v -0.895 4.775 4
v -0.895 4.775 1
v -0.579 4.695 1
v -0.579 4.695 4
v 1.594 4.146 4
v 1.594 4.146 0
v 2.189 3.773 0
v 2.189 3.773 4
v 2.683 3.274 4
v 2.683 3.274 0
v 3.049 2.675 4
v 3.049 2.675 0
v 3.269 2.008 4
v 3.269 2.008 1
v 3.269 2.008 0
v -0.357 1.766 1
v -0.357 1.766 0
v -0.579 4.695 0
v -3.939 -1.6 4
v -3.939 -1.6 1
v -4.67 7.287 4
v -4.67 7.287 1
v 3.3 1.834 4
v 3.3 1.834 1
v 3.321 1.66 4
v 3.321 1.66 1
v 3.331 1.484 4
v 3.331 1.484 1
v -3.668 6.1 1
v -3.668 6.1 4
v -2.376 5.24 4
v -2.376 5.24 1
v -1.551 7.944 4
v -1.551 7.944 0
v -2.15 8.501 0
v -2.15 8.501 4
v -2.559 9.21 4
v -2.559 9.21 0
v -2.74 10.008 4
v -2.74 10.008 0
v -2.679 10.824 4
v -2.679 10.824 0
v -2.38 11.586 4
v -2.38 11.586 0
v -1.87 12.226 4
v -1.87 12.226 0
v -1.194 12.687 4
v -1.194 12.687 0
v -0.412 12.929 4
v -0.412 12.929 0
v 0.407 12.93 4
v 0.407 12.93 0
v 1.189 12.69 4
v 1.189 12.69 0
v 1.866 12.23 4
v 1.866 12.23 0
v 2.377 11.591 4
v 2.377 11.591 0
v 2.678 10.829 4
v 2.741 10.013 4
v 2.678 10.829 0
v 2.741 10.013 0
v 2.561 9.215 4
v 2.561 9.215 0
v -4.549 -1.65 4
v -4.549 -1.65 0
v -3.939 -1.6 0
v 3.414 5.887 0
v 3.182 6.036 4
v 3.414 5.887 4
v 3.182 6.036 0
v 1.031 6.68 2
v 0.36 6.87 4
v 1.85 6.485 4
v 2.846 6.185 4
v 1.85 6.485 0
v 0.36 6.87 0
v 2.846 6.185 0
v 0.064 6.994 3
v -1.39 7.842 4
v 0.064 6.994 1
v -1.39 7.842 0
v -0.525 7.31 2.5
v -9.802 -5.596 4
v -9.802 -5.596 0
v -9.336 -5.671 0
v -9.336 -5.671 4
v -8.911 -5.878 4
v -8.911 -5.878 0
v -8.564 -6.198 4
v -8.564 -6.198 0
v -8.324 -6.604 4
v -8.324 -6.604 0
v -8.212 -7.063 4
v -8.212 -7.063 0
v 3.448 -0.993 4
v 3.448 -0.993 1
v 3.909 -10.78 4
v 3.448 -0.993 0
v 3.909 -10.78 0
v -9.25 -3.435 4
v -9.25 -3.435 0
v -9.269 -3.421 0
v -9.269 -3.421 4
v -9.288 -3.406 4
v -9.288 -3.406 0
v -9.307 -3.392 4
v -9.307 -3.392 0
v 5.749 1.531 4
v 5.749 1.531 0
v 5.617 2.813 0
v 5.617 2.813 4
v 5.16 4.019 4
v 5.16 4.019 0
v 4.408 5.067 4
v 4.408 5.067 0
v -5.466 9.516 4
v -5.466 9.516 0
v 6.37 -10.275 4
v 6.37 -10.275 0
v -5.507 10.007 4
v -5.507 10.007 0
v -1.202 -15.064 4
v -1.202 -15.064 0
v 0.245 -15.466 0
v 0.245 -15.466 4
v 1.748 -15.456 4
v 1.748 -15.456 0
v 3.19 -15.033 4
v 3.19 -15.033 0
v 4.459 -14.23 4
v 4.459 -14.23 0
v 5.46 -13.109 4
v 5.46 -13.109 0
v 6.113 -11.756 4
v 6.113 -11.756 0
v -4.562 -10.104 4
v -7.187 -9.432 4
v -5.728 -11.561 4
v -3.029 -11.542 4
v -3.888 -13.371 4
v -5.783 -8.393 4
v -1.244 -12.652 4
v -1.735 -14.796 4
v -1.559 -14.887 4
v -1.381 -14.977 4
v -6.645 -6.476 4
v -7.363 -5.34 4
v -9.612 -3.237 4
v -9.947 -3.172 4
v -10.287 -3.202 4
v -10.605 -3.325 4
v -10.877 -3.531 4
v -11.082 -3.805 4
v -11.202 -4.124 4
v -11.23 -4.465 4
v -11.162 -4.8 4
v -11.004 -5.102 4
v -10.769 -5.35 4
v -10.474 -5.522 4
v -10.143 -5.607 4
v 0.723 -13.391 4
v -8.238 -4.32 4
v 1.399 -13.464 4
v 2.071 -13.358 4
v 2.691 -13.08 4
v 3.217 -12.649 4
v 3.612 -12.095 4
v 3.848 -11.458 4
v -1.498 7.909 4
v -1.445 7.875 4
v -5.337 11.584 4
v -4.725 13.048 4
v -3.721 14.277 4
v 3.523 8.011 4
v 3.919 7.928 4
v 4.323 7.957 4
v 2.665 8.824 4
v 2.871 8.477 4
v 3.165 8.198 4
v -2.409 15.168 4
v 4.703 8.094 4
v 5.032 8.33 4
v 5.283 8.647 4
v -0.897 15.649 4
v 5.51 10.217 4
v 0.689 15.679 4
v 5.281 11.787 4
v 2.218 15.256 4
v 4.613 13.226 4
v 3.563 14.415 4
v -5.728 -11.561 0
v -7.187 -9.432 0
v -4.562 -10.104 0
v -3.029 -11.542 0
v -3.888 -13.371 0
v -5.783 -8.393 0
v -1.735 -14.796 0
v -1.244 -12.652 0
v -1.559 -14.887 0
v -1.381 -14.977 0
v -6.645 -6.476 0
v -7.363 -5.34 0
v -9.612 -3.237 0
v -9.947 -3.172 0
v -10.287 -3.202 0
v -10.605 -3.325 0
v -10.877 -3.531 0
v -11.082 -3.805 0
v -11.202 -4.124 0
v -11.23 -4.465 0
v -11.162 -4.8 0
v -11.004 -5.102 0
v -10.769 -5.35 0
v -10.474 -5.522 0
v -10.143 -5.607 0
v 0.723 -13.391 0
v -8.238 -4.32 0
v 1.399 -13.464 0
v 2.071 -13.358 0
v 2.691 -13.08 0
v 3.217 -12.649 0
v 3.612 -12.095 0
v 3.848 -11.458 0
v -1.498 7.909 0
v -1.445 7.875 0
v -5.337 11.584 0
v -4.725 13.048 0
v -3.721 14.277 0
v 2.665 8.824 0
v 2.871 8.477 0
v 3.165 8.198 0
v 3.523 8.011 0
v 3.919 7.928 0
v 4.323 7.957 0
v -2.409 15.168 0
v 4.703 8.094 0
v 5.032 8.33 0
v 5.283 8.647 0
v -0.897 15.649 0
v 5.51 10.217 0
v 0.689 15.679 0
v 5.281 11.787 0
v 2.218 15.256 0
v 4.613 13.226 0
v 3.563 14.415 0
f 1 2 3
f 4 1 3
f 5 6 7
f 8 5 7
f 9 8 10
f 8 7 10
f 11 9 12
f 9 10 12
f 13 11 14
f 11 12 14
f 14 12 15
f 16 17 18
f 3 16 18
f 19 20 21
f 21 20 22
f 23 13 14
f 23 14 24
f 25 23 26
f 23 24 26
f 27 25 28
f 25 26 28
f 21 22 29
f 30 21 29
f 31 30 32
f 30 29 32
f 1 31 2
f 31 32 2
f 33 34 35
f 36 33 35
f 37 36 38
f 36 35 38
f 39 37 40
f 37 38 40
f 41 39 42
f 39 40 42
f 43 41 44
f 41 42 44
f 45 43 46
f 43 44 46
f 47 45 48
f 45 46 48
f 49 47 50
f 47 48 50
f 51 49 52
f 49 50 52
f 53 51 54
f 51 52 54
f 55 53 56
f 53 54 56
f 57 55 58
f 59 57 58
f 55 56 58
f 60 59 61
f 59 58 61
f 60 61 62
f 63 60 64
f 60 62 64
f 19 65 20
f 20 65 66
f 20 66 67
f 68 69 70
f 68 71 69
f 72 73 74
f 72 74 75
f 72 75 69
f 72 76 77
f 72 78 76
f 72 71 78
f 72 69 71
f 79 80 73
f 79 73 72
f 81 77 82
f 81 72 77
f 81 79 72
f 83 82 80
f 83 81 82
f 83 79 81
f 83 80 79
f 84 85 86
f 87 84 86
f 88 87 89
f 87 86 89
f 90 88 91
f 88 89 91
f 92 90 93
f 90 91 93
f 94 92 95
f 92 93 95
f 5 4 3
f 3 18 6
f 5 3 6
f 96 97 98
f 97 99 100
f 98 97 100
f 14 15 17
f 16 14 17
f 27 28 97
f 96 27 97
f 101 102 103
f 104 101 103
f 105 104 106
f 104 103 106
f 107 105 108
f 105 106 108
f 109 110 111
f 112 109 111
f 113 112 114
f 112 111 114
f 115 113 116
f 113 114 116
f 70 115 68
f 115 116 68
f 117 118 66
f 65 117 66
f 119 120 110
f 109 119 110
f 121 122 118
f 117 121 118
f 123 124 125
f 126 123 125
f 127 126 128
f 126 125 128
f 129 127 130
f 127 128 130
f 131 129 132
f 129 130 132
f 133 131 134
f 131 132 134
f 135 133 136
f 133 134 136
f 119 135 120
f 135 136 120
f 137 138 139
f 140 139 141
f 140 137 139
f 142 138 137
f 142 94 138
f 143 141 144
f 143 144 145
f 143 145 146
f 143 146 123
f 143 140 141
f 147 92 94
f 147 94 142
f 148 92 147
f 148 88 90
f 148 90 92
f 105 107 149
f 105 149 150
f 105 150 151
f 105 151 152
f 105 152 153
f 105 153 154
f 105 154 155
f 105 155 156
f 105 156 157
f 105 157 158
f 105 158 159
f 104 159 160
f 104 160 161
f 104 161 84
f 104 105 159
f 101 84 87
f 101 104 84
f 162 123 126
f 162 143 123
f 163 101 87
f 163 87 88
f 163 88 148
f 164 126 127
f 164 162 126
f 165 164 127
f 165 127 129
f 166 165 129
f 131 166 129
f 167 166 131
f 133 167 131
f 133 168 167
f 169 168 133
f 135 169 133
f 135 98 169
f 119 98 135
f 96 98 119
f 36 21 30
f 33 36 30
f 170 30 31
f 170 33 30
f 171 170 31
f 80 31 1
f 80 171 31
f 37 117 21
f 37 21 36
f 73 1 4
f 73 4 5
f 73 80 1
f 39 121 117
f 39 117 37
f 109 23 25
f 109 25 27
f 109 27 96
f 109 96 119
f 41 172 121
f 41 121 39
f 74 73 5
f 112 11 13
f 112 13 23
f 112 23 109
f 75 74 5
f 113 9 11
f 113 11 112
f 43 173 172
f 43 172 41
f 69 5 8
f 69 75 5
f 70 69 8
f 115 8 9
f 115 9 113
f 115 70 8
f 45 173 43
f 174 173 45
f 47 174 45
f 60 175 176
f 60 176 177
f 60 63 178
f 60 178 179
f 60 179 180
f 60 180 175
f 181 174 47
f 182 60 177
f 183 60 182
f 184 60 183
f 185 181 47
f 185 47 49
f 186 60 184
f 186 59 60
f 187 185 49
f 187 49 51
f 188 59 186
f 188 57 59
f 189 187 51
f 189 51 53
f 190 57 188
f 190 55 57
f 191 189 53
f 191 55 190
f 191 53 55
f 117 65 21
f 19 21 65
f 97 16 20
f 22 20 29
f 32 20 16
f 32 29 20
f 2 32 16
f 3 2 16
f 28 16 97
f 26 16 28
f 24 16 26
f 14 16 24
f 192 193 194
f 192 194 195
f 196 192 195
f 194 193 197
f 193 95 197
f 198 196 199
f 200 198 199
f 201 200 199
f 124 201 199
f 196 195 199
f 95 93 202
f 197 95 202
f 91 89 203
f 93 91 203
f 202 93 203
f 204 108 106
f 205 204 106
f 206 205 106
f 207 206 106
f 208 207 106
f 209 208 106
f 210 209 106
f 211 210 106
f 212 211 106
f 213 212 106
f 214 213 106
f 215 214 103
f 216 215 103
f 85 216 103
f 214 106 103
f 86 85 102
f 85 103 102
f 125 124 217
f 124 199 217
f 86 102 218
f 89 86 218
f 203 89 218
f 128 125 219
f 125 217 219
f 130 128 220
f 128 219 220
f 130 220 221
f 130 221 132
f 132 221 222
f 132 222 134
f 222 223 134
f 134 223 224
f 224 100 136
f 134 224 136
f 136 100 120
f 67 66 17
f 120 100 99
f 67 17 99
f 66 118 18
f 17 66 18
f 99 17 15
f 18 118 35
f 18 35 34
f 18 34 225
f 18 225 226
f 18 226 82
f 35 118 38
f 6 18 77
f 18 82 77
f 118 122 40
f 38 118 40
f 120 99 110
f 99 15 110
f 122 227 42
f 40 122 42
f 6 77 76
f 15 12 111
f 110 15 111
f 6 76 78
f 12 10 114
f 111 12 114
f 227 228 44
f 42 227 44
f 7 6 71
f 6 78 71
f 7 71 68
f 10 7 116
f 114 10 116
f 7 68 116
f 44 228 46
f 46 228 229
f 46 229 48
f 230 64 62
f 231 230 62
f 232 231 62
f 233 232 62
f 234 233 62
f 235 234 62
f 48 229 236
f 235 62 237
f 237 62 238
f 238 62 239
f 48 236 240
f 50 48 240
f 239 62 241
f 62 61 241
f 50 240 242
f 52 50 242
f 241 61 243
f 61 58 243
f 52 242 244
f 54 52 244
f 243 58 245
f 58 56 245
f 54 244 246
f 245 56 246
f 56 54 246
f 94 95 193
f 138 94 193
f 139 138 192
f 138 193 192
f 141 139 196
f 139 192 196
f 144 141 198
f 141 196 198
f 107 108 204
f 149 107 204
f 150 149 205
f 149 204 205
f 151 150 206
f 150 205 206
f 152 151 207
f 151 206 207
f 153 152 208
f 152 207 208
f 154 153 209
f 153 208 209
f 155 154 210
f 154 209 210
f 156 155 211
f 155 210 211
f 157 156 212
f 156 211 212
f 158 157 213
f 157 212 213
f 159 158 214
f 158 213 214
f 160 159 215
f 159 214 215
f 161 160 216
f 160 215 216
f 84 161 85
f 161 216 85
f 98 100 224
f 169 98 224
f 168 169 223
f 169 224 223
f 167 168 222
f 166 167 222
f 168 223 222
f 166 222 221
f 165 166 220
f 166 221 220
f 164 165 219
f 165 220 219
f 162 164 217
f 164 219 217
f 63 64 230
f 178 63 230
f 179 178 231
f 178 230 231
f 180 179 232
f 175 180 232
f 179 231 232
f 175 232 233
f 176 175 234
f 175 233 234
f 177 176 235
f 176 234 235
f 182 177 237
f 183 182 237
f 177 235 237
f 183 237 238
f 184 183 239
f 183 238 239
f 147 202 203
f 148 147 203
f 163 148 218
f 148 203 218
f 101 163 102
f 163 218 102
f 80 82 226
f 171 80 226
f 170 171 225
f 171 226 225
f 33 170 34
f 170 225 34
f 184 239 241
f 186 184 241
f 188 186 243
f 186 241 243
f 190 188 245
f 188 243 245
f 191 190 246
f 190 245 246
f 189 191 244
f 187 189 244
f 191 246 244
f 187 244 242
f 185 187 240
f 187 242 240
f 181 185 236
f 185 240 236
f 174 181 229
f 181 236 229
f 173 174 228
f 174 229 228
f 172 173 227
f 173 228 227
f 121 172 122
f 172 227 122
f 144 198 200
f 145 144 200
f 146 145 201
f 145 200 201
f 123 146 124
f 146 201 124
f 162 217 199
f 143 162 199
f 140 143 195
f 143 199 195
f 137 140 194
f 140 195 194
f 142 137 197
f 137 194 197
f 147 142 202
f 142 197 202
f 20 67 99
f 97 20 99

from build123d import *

# Parameters (mm, degrees)
F1_DEPTH = 4
F2_DEPTH = 1
F3_DEPTH = 4


with BuildPart() as f1:
    # F0 (on Top) → F1 (new body)
    with BuildSketch(Plane.XY):
        with BuildLine():
            ThreePointArc((-1.5508525785, 7.9438418354), (-0.8117387783, 12.8375466645), (2.5605860204, 9.2151080362))
            ThreePointArc((2.5605860204, 9.2151080362), (3.7184283285, 7.9559790876), (5.2833155314, 8.6467269154))
            ThreePointArc((5.2833155314, 8.6467269154), (0.6891933533, 15.6793977841), (-5.5065598875, 10.00691509))
            Line((-5.5065598875, 10.00691509), (-5.4662271831, 9.5160487318))
            ThreePointArc((-5.4662271831, 9.5160487318), (-5.1890353006, 8.3580166056), (-4.6695398419, 7.2865698204))
            ThreePointArc((-4.6695398419, 7.2865698204), (-3.0526487171, 5.624718363), (-0.8952786583, 4.7751057418))
            Line((-0.8952786583, 4.7751057418), (-0.5786401844, 4.6951146522))
            Line((-0.5786401844, 4.6951146522), (1.5938929177, 4.1462764523))
            ThreePointArc((1.5938929177, 4.1462764523), (2.6825813347, 3.2735631577), (3.2693851036, 2.0076515096))
            ThreePointArc((3.2693851036, 2.0076515096), (3.3114958995, 1.7472962445), (3.3309836872, 1.4842783567))
            Line((3.3309836872, 1.4842783567), (3.4477516729, -0.9928926231))
            Line((3.4477516729, -0.9928926231), (3.9091161415, -10.7804954964))
            ThreePointArc((3.9091161415, -10.7804954964), (2.9687698725, -12.8820847985), (0.7233424694, -13.3909899741))
            ThreePointArc((0.7233424694, -13.3909899741), (-3.8310752971, -10.860666841), (-6.6450210288, -6.4758104272))
            ThreePointArc((-6.6450210288, -6.4758104272), (-7.7820397087, -4.8140308867), (-9.2495143625, -3.4353210333))
            ThreePointArc((-9.2495143625, -3.4353210333), (-9.2784237273, -3.4136155218), (-9.3074170873, -3.3920223359))
            ThreePointArc((-9.3074170873, -3.3920223359), (-11.2022703258, -4.1244357737), (-9.8017050698, -5.5959367772))
            ThreePointArc((-9.8017050698, -5.5959367772), (-8.7259718037, -6.0249943061), (-8.2120165113, -7.0628490071))
            ThreePointArc((-8.2120165113, -7.0628490071), (-5.7280471213, -11.5611556114), (-1.7350801949, -14.7955151093))
            ThreePointArc((-1.7350801949, -14.7955151093), (-1.4700198659, -14.9324899814), (-1.201978699, -15.0635358758))
            ThreePointArc((-1.201978699, -15.0635358758), (3.8524766741, -14.675655203), (6.3695942874, -10.2754177713))
            Line((6.3695942874, -10.2754177713), (5.7489675473, 1.5311539041))
            ThreePointArc((5.7489675473, 1.5311539041), (5.1595327201, 4.0189158193), (3.4136745307, 5.8866341986))
            add(Edge.make_bspline(
                [(-1.3902529619, 7.8420158064), (0.0180558581, 6.9514744016), (0.5184174589, 6.7699007224), (2.976767486, 6.2503702939), (3.4136745307, 5.8866341986)],
                knots=[0.018384806, 0.018384806, 0.018384806, 0.018384806, 0.516913737, 1, 1, 1, 1], degree=3))
            ThreePointArc((-1.3902529619, 7.8420158064), (-1.4714338534, 7.8915391799), (-1.5508525785, 7.9438418354))
        make_face()
    extrude(amount=F1_DEPTH)

    # F0 (on Top) → F2 (join)
    with BuildSketch(Plane.XY):
        with BuildLine():
            ThreePointArc((-0.8952786583, 4.7751057418), (-3.0526487171, 5.624718363), (-4.6695398419, 7.2865698204))
            Line((-4.6695398419, 7.2865698204), (-3.9393737235, -1.599865865))
            Line((-3.9393737235, -1.599865865), (3.4477516729, -0.9928926231))
            Line((3.4477516729, -0.9928926231), (3.3309836872, 1.4842783567))
            ThreePointArc((3.3309836872, 1.4842783567), (3.3114958995, 1.7472962445), (3.2693851036, 2.0076515096))
            Line((3.2693851036, 2.0076515096), (-0.3569517285, 1.7655659467))
            Line((-0.3569517285, 1.7655659467), (-0.5786401844, 4.6951146522))
            Line((-0.5786401844, 4.6951146522), (-0.8952786583, 4.7751057418))
        make_face()
    extrude(amount=F2_DEPTH)

    # F0 (on Top) → F3 (join)
    with BuildSketch(Plane.XY):
        with BuildLine():
            ThreePointArc((-4.6695398419, 7.2865698204), (-5.1890353006, 8.3580166056), (-5.4662271831, 9.5160487318))
            Line((-5.4662271831, 9.5160487318), (-4.5487587385, -1.6499368166))
            Line((-4.5487587385, -1.6499368166), (-3.9393737235, -1.599865865))
            Line((-3.9393737235, -1.599865865), (-4.6695398419, 7.2865698204))
        make_face()
    extrude(amount=F3_DEPTH)


solid = f1.part
